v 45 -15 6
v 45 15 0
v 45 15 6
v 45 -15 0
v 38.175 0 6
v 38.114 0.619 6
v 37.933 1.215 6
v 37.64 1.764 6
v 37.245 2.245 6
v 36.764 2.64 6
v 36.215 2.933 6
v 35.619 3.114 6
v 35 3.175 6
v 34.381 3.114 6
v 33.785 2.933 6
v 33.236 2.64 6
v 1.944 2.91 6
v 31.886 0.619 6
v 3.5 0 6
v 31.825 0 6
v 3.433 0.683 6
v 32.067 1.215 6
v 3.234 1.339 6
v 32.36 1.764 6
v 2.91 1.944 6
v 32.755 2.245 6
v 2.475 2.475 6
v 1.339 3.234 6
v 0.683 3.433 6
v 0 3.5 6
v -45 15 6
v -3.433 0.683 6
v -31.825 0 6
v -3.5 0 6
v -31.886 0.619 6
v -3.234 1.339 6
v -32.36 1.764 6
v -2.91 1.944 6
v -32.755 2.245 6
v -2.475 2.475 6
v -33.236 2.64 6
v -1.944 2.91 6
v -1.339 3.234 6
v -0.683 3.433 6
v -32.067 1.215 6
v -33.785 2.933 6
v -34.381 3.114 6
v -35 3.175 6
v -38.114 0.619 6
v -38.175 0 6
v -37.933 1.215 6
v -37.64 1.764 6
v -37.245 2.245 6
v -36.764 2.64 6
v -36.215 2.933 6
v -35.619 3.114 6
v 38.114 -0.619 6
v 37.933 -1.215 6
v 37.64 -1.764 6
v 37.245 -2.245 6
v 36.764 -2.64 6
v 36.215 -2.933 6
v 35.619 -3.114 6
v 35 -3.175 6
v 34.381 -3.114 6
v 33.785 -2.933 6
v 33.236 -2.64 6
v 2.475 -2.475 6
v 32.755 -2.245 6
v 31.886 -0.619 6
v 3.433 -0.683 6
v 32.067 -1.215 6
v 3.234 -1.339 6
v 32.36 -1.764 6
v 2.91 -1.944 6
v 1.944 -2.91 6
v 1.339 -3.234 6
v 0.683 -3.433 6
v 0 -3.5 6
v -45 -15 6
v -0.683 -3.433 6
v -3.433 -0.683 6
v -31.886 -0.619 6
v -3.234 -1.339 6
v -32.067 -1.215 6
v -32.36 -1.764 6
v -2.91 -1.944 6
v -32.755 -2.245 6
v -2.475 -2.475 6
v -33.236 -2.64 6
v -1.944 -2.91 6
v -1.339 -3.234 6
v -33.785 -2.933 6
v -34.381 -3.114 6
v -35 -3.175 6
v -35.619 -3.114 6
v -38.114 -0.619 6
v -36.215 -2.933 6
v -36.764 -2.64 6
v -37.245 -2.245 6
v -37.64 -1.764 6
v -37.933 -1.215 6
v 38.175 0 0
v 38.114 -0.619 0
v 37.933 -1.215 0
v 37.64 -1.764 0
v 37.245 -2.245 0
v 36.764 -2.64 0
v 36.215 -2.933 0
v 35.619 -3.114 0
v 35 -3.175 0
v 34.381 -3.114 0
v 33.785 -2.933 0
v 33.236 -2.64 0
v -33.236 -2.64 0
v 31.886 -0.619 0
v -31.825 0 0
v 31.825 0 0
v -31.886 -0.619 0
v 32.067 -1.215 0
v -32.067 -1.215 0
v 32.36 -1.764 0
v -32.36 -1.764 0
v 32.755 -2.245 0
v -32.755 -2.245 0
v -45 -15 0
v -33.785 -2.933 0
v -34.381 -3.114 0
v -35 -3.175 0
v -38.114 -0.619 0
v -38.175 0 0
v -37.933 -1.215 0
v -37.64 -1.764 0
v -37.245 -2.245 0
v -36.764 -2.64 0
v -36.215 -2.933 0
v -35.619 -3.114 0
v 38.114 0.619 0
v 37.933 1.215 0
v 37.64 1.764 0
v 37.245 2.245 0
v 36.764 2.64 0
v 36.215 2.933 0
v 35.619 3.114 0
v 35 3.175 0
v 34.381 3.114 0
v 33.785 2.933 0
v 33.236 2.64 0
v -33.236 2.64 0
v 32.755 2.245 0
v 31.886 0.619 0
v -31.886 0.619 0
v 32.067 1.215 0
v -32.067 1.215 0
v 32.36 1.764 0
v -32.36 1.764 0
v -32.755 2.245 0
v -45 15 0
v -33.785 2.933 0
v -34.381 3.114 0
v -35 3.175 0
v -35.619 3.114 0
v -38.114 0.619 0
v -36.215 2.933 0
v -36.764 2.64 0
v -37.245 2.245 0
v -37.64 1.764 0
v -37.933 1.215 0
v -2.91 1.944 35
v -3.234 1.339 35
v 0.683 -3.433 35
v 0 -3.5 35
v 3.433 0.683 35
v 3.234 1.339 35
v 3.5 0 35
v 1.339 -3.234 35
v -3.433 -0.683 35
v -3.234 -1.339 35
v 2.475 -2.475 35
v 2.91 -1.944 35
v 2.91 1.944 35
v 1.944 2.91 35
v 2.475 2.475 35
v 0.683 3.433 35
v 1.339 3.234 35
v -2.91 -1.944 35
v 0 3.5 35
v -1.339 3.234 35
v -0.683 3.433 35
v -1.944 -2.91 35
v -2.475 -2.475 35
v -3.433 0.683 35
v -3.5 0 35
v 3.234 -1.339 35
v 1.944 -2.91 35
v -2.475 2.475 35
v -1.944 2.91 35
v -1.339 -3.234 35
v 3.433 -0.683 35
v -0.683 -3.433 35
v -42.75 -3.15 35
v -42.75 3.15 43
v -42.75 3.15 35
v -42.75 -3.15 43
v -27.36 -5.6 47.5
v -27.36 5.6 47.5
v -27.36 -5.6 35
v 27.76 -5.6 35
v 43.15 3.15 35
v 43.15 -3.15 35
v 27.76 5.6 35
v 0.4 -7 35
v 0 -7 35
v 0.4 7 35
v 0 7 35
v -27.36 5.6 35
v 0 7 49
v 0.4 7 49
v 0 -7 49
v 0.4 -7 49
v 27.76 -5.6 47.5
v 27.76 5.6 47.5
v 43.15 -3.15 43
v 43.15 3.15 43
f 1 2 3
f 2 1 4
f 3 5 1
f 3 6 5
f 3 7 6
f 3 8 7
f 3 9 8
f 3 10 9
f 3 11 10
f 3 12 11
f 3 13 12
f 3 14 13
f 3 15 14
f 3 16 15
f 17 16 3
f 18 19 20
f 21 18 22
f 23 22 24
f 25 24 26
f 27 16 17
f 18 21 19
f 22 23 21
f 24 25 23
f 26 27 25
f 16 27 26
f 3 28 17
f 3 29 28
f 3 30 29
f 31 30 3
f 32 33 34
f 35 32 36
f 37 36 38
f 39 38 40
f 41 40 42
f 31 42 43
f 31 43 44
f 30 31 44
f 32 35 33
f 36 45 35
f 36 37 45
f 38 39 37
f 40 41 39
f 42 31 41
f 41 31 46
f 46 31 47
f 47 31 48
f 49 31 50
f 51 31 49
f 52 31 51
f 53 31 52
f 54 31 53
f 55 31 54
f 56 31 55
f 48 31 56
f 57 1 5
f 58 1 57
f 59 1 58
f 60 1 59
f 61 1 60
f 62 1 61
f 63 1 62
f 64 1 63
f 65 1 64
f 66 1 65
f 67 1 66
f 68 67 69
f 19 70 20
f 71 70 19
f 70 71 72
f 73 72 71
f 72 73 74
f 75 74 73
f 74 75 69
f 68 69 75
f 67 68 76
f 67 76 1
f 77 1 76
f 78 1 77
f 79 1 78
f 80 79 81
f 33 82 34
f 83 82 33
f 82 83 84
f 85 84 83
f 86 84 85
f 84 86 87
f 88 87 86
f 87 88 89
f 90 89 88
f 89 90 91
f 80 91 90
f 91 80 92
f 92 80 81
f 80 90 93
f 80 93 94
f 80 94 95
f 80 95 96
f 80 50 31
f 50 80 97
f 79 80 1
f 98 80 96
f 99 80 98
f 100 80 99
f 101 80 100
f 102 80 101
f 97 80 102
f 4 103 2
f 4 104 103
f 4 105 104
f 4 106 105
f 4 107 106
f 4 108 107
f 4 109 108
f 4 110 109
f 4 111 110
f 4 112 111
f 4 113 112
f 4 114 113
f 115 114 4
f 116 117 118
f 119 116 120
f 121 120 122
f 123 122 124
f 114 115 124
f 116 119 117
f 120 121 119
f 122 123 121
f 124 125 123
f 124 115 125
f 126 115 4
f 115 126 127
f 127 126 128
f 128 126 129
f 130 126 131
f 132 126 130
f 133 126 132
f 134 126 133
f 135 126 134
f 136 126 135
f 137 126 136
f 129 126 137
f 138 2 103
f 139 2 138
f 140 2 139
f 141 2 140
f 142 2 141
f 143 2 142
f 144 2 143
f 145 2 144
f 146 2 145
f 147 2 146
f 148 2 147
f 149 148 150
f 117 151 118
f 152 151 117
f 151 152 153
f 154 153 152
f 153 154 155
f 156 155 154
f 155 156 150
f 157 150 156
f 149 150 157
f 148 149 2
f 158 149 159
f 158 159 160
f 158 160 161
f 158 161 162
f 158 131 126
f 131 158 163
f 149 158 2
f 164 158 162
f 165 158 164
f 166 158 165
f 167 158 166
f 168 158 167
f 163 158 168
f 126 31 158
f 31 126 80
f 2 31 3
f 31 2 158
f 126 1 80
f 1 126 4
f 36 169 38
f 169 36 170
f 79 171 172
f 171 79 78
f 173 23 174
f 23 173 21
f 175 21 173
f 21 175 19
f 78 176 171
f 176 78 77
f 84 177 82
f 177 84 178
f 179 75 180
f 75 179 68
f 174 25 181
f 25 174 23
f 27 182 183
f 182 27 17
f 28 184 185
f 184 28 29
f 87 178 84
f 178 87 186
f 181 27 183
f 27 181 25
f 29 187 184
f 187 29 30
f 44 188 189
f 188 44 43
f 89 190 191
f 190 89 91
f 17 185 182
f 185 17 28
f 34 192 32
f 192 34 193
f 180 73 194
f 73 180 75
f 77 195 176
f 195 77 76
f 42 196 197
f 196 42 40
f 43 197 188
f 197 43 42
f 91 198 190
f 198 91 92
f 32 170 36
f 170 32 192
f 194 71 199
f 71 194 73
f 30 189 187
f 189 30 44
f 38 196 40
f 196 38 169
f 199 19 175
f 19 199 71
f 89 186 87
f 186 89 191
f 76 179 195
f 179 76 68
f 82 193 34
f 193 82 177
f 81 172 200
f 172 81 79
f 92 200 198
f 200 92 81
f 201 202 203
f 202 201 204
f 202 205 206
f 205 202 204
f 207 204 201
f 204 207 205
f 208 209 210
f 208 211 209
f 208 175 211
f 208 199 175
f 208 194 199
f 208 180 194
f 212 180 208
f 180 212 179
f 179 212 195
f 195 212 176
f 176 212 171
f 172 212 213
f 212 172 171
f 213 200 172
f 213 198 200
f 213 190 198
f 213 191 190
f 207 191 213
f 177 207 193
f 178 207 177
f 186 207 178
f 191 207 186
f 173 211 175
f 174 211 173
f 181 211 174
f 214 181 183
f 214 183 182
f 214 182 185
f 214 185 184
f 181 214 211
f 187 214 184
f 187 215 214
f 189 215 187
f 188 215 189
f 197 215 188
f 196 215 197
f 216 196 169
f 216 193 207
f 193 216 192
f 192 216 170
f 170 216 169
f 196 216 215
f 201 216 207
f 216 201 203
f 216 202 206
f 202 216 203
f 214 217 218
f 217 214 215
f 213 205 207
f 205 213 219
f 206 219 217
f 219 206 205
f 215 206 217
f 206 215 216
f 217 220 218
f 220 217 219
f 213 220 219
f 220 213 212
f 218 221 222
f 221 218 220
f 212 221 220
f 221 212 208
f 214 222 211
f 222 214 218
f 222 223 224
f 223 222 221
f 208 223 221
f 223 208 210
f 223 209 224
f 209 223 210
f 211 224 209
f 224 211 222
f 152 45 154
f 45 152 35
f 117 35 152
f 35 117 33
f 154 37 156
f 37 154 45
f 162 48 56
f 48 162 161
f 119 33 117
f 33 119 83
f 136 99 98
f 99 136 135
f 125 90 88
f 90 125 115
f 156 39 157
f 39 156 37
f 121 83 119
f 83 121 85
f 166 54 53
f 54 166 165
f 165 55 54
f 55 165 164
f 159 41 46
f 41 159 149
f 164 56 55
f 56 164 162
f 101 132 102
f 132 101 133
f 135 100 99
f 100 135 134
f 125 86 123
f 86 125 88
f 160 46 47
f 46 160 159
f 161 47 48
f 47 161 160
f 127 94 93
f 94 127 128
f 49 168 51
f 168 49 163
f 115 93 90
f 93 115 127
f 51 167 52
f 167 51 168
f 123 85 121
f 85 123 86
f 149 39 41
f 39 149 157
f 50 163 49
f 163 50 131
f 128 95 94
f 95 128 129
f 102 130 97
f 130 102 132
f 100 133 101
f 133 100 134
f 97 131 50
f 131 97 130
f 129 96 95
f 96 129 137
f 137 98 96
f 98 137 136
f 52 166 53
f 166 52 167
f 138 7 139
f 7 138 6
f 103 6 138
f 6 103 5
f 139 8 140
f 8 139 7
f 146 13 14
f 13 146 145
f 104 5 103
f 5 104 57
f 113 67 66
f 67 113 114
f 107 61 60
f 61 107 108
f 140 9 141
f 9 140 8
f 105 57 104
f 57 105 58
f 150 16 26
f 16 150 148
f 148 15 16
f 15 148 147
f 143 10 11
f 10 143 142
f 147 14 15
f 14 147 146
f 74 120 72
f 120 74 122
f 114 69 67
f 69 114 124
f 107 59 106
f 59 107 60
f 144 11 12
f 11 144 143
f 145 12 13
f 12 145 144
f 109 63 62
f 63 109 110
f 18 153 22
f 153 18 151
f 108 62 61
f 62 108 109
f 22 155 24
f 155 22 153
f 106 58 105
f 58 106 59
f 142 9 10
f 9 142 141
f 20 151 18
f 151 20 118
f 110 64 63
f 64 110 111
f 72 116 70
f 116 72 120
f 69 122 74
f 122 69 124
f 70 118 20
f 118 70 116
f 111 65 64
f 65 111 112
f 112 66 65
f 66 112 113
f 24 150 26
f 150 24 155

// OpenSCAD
$fn = 32;

// ----------------------------------------------------------------------
// Boat cleat: 90 mm base, horn 42 mm up
// ----------------------------------------------------------------------

// --- parameters (mm) ---
base_l = 90;              // base length
base_w = 30;              // base width
base_t = 6;               // base thickness
horn_len = 85.5;          // horn length
horn_d = 14;              // horn diameter at the middle
horn_z = 42;              // horn axis height
end_drop = 6;             // how far the horn tips drop
post_d = 7;               // centre post diameter
holes_d = 6.35;           // fixing holes
hole_x = 35;              // fixing hole spacing

difference() {
  union() {
    translate([-45, -15, 0]) cube([base_l, base_w, base_t]);
    /* centre post, sunk 1 mm into the base */
    translate([0, 0, 5]) cylinder(h = 37, d = post_d);
    /* horn: a hull chain of boxes, full in the middle and lighter at the tips */
    hull() {
      translate([-42.75, -3.15, 35]) cube([0.4, 6.3, 8], center = false);
      translate([-27.36, -5.6, 35]) cube([0.4, 11.2, 12.5], center = false);
    }
    hull() {
      translate([-27.36, -5.6, 35]) cube([0.4, 11.2, 12.5], center = false);
      translate([0, -7, 35]) cube([0.4, 14, 14], center = false);
    }
    hull() {
      translate([0, -7, 35]) cube([0.4, 14, 14], center = false);
      translate([27.36, -5.6, 35]) cube([0.4, 11.2, 12.5], center = false);
    }
    hull() {
      translate([27.36, -5.6, 35]) cube([0.4, 11.2, 12.5], center = false);
      translate([42.75, -3.15, 35]) cube([0.4, 6.3, 8], center = false);
    }
  }
  translate([-35, 0, -2.5]) cylinder(h = base_t + 5, d = holes_d);
  translate([35, 0, -2.5]) cylinder(h = base_t + 5, d = holes_d);
}
